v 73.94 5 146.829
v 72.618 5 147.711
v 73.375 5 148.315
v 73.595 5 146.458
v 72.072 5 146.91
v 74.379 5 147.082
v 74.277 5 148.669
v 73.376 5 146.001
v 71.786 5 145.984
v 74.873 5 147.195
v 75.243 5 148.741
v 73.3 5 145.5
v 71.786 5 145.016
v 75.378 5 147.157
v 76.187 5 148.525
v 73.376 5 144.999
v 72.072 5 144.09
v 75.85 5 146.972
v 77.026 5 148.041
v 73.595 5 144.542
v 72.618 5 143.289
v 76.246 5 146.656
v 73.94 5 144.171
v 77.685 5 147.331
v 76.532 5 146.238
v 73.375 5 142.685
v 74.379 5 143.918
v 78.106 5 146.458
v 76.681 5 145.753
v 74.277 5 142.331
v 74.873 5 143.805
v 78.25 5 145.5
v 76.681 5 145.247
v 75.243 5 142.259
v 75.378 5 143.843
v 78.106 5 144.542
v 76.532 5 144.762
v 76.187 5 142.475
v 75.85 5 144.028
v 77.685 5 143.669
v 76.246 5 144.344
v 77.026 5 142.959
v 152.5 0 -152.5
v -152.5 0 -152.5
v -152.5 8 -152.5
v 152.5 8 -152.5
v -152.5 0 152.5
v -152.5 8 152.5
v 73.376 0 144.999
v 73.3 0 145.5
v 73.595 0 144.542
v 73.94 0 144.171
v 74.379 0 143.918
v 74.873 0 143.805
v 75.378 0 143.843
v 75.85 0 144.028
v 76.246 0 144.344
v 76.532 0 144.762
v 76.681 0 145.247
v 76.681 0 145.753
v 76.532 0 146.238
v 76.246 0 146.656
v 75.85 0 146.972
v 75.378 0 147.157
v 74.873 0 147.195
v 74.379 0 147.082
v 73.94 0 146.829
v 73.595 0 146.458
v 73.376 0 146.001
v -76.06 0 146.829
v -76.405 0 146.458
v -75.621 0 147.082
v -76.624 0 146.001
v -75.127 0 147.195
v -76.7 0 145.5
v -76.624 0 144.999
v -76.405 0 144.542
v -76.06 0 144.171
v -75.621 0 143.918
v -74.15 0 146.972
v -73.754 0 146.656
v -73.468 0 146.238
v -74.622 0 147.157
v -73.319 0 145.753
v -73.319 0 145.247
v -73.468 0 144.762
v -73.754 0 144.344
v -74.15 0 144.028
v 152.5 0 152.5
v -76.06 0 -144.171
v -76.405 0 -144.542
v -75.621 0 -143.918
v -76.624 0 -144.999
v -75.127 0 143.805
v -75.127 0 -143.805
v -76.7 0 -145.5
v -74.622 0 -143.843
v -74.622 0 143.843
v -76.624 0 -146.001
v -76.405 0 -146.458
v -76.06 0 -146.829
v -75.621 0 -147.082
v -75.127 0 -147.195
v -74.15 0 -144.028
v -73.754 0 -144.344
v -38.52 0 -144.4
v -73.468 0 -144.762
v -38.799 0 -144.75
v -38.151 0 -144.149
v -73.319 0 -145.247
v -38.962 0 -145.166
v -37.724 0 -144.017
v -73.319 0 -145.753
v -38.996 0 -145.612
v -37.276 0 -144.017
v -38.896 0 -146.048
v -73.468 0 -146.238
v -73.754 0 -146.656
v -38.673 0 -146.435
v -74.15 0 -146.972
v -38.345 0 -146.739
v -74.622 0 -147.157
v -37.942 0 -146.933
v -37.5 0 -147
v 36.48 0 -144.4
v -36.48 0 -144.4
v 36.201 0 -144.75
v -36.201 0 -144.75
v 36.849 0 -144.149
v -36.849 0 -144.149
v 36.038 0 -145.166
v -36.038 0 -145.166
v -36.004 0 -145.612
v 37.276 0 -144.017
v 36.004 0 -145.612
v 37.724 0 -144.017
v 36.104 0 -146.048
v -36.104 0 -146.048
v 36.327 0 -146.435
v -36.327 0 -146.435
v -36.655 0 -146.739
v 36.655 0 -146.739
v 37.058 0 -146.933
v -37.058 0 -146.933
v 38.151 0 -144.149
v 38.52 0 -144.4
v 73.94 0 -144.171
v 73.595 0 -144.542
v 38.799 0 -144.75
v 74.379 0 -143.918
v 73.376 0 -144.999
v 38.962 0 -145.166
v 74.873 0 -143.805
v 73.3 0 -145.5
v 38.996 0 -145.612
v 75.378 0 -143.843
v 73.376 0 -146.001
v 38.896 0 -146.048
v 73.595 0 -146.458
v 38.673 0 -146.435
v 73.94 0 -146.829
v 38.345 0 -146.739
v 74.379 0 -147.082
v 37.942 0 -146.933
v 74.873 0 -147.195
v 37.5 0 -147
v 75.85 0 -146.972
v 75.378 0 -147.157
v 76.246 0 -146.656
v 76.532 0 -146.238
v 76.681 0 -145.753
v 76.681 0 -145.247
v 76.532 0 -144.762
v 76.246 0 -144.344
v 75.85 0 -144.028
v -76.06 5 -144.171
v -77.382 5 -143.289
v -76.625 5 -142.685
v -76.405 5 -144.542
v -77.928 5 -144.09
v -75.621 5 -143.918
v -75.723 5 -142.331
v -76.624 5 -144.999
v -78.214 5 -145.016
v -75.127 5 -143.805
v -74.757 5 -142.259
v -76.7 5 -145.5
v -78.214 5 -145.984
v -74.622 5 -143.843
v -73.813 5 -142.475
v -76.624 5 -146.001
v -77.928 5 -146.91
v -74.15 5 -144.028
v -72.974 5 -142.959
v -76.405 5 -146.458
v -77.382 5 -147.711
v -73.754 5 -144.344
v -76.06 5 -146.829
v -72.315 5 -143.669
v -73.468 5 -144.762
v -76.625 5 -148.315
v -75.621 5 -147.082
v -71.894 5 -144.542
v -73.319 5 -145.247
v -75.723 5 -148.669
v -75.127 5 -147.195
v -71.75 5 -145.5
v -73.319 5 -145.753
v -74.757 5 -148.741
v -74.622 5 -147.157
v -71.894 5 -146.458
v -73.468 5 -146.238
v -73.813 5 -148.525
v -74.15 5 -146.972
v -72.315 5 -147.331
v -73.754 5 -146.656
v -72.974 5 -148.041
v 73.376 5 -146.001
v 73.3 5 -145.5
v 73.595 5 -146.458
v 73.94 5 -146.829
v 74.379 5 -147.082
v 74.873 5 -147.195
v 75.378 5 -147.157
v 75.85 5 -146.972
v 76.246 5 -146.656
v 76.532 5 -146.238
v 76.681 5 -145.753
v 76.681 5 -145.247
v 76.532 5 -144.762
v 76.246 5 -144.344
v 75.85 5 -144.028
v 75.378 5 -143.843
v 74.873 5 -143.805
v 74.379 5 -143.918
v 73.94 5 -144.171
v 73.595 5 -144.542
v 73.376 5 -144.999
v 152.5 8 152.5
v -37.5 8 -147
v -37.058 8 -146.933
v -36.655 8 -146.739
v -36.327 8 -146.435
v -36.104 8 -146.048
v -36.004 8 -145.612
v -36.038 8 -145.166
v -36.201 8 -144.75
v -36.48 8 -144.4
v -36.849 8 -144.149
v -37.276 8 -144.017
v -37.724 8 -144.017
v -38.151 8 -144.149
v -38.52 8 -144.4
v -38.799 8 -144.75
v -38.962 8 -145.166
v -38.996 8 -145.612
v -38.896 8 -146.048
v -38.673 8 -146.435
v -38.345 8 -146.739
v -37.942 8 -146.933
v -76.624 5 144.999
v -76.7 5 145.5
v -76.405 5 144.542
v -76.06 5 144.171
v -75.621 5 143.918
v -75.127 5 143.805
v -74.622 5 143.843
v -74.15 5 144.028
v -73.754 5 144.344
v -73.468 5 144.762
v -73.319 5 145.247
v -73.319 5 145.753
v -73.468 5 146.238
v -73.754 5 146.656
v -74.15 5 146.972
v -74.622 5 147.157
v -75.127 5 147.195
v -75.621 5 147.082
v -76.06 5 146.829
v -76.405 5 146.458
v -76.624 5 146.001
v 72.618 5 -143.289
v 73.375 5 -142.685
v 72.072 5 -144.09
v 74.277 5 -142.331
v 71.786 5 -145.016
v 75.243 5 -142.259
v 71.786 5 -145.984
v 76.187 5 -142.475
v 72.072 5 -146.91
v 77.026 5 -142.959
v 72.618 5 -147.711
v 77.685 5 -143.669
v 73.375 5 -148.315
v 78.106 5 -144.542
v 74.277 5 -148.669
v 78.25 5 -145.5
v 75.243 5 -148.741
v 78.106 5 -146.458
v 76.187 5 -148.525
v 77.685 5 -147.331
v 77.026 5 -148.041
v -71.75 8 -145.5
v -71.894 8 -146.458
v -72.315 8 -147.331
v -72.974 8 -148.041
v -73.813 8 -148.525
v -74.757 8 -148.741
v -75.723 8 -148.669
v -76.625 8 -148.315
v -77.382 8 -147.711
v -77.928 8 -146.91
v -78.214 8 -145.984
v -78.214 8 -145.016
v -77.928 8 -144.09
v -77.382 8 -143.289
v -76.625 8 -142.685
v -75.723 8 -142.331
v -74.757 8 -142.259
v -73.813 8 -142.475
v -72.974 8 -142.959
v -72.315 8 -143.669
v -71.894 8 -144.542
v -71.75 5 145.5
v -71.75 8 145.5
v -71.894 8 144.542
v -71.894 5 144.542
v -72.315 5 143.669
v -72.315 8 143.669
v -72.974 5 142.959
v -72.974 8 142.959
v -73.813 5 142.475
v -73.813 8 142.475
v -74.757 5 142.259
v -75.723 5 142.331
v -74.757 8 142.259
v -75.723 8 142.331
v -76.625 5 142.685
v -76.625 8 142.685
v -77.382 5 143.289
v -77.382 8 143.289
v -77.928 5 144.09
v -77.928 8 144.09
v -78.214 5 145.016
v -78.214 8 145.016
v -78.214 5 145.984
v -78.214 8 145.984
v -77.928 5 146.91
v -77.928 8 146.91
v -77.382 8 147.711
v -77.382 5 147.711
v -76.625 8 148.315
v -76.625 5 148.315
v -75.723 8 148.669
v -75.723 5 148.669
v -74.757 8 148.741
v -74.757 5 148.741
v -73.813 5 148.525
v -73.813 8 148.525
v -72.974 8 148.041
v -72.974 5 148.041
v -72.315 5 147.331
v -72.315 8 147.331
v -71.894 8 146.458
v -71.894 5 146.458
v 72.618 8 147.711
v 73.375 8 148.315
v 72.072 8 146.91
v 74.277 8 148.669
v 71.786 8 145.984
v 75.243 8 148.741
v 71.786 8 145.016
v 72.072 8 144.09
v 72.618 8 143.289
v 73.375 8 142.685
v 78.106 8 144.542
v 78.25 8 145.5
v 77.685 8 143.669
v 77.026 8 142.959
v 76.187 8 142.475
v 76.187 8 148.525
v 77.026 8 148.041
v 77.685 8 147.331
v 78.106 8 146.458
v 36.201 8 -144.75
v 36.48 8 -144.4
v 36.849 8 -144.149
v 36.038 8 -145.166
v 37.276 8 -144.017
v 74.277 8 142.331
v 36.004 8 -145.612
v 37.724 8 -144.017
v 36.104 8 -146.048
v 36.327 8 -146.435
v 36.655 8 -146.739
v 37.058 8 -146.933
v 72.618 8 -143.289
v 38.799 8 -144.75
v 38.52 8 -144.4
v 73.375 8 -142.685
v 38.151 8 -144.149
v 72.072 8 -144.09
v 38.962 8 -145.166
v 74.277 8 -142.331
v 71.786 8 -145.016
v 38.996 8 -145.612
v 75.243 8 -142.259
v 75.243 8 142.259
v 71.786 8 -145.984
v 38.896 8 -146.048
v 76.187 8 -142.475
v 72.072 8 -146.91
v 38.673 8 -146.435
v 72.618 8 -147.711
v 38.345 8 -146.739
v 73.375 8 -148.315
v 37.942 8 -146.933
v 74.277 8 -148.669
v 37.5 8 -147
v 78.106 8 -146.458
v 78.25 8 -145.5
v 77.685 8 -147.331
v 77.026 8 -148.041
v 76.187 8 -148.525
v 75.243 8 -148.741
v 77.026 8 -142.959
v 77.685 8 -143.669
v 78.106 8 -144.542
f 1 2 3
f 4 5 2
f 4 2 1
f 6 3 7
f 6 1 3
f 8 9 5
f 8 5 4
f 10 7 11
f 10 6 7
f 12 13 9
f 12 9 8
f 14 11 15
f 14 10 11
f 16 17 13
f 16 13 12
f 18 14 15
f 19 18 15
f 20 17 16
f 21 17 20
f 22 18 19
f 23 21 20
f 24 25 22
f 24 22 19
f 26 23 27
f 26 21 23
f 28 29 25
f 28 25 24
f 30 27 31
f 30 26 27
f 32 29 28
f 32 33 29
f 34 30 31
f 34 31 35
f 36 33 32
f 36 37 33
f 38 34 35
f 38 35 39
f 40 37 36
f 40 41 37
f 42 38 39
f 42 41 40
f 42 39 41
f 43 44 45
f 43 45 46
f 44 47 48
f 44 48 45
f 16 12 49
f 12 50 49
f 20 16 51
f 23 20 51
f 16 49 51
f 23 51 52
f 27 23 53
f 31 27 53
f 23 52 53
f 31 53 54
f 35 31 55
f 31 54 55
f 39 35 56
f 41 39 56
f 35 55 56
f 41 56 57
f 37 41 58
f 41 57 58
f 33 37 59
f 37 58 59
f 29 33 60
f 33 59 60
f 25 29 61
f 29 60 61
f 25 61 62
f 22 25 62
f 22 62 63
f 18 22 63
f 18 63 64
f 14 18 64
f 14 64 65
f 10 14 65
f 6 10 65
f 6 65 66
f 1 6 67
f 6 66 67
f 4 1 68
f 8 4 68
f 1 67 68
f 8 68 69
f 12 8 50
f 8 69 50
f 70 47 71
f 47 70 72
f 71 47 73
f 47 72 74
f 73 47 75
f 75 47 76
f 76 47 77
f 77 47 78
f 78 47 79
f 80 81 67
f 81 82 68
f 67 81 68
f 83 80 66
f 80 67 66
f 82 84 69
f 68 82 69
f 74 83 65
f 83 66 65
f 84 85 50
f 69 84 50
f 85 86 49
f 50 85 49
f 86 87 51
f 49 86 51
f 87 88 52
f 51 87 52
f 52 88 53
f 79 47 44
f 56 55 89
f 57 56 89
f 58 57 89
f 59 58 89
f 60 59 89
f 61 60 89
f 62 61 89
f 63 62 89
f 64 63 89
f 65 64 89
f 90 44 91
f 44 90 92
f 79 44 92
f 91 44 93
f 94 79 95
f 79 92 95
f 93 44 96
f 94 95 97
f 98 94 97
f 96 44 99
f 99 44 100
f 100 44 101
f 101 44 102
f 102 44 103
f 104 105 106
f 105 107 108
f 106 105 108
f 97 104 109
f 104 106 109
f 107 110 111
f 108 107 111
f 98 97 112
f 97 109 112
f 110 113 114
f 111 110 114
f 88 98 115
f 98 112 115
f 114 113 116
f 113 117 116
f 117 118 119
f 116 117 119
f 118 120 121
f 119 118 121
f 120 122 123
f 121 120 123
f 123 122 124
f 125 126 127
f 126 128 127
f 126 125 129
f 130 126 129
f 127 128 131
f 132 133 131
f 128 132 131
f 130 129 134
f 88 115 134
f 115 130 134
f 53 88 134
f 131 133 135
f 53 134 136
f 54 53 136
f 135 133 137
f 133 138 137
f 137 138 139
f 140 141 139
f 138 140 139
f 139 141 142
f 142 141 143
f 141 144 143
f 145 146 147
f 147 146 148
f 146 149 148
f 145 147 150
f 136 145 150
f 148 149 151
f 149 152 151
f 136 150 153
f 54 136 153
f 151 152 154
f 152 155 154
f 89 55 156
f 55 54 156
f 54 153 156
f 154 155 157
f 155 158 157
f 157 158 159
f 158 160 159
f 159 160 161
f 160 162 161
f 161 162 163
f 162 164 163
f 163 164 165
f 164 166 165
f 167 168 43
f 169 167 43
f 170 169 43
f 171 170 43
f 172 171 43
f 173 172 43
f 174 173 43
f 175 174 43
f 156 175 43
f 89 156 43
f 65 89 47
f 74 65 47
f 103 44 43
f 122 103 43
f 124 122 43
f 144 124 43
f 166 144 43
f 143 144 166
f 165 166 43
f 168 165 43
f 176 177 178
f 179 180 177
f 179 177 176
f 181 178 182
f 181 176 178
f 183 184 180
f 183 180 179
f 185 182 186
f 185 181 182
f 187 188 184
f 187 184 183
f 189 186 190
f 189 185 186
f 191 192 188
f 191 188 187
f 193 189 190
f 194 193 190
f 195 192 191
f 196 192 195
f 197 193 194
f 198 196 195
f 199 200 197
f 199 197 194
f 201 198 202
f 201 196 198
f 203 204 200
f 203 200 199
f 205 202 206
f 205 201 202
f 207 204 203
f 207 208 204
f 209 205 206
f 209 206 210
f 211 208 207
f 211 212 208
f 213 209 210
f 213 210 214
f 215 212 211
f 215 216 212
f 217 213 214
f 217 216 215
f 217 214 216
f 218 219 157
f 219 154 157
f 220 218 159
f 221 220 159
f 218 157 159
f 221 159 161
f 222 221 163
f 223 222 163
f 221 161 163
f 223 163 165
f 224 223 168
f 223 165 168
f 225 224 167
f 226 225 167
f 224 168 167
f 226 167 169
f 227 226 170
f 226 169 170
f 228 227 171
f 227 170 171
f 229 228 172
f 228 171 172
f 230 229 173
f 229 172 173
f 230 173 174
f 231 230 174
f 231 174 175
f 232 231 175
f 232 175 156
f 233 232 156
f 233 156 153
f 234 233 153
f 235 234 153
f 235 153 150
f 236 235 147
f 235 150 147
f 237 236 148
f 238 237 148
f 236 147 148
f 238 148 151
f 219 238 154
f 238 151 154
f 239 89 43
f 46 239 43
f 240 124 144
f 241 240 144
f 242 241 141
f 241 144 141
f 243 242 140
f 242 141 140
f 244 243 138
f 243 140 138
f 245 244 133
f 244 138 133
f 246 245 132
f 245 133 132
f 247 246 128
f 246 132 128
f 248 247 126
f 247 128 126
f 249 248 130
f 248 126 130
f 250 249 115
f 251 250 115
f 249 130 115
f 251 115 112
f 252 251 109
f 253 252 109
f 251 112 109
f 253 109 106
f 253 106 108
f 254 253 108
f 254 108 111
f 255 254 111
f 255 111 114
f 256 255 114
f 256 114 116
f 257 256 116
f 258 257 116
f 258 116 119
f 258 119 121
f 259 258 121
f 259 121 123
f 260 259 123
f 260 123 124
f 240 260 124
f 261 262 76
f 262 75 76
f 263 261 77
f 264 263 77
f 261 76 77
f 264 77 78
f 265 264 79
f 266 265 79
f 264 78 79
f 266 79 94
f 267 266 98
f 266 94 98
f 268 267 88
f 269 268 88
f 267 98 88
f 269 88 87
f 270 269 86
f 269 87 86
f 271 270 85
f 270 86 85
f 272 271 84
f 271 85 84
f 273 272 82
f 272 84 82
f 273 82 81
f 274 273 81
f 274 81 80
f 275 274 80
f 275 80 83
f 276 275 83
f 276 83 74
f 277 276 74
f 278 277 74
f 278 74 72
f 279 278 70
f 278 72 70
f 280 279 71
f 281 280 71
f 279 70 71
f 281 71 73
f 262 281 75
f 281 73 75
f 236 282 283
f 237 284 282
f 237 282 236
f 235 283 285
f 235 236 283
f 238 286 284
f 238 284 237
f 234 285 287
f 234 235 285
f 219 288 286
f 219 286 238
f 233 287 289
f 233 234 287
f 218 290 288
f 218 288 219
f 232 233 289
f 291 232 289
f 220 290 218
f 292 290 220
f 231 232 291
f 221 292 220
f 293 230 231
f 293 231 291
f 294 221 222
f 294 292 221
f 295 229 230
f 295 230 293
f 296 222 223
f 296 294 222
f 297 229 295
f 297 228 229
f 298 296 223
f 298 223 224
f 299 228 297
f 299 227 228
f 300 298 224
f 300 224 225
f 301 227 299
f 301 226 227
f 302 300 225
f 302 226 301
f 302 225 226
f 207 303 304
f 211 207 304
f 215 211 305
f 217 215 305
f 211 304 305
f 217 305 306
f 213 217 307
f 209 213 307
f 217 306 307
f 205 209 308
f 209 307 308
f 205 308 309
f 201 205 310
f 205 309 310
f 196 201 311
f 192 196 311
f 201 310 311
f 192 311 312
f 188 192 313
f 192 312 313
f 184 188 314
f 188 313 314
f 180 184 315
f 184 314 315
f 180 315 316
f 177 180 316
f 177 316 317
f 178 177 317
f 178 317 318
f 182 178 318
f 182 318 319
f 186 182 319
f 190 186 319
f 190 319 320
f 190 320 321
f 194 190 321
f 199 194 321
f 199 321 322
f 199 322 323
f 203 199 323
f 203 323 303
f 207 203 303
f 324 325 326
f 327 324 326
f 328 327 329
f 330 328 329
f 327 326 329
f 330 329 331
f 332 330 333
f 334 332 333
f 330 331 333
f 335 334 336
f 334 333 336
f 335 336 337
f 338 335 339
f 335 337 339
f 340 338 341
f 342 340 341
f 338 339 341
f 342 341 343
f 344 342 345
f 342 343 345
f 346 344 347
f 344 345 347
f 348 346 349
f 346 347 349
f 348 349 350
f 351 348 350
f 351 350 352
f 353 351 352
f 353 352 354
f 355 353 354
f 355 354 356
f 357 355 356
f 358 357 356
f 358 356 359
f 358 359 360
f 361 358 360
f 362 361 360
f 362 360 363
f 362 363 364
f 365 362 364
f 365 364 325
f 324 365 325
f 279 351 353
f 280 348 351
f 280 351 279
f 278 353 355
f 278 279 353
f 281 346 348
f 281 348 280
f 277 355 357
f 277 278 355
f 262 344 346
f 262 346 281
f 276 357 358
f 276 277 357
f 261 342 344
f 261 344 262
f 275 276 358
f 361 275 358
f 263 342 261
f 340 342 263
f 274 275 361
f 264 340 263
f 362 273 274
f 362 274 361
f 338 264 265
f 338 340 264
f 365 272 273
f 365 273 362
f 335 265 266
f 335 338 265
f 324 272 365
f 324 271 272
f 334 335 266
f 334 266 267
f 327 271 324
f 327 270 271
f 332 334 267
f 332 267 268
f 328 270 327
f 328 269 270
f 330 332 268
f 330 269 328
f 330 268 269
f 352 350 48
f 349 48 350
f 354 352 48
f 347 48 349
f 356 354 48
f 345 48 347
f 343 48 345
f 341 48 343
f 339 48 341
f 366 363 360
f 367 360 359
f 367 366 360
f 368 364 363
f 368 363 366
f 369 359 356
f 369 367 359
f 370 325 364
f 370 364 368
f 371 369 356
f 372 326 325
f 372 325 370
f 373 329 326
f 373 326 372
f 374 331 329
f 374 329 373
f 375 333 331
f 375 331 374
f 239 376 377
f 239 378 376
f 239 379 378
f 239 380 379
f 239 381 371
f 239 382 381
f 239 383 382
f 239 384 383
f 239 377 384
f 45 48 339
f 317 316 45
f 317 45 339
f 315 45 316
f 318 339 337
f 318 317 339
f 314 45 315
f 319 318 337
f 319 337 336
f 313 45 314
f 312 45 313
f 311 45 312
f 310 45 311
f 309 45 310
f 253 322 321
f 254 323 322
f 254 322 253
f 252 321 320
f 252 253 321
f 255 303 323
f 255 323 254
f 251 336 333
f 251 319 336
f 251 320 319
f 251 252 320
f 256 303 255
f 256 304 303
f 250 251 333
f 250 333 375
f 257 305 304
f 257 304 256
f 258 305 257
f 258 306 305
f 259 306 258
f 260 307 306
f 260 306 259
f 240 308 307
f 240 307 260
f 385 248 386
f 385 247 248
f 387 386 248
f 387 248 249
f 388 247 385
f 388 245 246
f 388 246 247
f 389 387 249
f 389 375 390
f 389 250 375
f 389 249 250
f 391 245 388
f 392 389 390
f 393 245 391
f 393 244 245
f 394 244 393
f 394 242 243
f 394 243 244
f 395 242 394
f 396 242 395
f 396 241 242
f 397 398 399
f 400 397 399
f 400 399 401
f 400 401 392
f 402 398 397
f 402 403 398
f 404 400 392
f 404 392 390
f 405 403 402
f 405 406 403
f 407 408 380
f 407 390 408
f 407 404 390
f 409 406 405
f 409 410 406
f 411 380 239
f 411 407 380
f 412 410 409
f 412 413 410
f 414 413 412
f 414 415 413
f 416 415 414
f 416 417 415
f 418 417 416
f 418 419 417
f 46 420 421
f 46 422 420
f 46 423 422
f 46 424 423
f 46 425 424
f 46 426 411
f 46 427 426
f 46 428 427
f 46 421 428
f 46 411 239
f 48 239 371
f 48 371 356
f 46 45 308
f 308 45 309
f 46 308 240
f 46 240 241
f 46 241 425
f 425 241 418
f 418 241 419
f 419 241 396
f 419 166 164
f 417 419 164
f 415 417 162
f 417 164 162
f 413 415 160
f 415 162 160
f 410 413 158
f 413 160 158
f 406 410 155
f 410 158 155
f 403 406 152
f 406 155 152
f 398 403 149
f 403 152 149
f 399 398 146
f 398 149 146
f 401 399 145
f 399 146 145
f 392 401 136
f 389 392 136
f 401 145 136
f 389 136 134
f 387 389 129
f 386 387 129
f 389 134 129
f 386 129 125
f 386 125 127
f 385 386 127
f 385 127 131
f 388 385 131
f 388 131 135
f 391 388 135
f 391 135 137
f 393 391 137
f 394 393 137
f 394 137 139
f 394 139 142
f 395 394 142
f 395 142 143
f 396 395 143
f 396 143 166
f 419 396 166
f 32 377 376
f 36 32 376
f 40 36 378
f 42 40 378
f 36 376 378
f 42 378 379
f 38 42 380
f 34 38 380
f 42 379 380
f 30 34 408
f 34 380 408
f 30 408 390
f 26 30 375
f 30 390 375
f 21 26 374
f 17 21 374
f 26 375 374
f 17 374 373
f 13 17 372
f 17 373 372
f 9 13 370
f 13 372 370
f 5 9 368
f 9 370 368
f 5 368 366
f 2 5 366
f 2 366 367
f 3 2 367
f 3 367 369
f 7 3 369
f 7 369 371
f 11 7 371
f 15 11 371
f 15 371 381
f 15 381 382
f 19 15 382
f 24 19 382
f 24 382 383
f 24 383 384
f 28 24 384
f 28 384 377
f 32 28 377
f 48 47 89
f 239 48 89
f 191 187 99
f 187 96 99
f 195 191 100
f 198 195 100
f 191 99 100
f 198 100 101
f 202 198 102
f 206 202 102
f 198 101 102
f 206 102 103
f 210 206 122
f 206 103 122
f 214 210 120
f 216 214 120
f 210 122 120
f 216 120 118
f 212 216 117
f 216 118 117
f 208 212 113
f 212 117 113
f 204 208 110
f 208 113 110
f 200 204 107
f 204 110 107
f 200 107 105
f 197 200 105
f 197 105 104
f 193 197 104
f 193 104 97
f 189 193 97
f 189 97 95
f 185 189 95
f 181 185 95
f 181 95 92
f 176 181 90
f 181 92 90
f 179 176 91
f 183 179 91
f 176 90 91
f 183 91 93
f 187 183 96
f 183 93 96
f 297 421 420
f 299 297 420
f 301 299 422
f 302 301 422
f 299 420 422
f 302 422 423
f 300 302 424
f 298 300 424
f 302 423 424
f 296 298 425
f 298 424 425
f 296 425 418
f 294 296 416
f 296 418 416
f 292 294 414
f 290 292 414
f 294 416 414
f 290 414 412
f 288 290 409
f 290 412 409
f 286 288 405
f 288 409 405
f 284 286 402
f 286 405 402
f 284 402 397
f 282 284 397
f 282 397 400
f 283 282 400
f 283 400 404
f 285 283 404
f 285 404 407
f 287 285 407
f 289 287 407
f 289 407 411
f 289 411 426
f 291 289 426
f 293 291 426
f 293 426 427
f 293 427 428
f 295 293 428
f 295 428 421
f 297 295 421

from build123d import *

# Parameters (mm, degrees)
SKETCH_1_W                     = 305
SKETCH_1_H                     = 305
EXTRUDE_1_DEPTH                = 8
HOLE_WIZARD_M1_6_1_D           = 3.4
HOLE_WIZARD_M1_6_1_CBORE_D     = 6.5
HOLE_WIZARD_M1_6_1_CBORE_DEPTH = 3
HOLE_WIZARD_M3_1_D             = 3


with BuildPart() as part:
    # 草图1 → 凸台-拉伸1 (new body)
    with BuildSketch(Plane(origin=(0, 0, 0), x_dir=(1, 0, 0), z_dir=(0, 1, 0))):
        Rectangle(SKETCH_1_W, SKETCH_1_H)
    extrude(amount=EXTRUDE_1_DEPTH)

    # M1.6 六角头螺栓的柱形沉头孔1 (through all)
    with Locations(Plane(origin=(0, 8, 0), x_dir=(1, 0, 0), z_dir=(0, 1, 0))):
        with Locations((-75, 145.5), (75, 145.5), (75, -145.5), (-75, -145.5)):
            CounterBoreHole(HOLE_WIZARD_M1_6_1_D / 2, HOLE_WIZARD_M1_6_1_CBORE_D / 2, HOLE_WIZARD_M1_6_1_CBORE_DEPTH)

    # M3 螺纹孔1 (through all)
    with Locations(Plane(origin=(-37.5, 8, -145.5), x_dir=(0, 0, 1), z_dir=(0, 1, 0))):
        with Locations((0, 0), (0, 75)):
            Hole(HOLE_WIZARD_M3_1_D / 2)


solid = part.part
